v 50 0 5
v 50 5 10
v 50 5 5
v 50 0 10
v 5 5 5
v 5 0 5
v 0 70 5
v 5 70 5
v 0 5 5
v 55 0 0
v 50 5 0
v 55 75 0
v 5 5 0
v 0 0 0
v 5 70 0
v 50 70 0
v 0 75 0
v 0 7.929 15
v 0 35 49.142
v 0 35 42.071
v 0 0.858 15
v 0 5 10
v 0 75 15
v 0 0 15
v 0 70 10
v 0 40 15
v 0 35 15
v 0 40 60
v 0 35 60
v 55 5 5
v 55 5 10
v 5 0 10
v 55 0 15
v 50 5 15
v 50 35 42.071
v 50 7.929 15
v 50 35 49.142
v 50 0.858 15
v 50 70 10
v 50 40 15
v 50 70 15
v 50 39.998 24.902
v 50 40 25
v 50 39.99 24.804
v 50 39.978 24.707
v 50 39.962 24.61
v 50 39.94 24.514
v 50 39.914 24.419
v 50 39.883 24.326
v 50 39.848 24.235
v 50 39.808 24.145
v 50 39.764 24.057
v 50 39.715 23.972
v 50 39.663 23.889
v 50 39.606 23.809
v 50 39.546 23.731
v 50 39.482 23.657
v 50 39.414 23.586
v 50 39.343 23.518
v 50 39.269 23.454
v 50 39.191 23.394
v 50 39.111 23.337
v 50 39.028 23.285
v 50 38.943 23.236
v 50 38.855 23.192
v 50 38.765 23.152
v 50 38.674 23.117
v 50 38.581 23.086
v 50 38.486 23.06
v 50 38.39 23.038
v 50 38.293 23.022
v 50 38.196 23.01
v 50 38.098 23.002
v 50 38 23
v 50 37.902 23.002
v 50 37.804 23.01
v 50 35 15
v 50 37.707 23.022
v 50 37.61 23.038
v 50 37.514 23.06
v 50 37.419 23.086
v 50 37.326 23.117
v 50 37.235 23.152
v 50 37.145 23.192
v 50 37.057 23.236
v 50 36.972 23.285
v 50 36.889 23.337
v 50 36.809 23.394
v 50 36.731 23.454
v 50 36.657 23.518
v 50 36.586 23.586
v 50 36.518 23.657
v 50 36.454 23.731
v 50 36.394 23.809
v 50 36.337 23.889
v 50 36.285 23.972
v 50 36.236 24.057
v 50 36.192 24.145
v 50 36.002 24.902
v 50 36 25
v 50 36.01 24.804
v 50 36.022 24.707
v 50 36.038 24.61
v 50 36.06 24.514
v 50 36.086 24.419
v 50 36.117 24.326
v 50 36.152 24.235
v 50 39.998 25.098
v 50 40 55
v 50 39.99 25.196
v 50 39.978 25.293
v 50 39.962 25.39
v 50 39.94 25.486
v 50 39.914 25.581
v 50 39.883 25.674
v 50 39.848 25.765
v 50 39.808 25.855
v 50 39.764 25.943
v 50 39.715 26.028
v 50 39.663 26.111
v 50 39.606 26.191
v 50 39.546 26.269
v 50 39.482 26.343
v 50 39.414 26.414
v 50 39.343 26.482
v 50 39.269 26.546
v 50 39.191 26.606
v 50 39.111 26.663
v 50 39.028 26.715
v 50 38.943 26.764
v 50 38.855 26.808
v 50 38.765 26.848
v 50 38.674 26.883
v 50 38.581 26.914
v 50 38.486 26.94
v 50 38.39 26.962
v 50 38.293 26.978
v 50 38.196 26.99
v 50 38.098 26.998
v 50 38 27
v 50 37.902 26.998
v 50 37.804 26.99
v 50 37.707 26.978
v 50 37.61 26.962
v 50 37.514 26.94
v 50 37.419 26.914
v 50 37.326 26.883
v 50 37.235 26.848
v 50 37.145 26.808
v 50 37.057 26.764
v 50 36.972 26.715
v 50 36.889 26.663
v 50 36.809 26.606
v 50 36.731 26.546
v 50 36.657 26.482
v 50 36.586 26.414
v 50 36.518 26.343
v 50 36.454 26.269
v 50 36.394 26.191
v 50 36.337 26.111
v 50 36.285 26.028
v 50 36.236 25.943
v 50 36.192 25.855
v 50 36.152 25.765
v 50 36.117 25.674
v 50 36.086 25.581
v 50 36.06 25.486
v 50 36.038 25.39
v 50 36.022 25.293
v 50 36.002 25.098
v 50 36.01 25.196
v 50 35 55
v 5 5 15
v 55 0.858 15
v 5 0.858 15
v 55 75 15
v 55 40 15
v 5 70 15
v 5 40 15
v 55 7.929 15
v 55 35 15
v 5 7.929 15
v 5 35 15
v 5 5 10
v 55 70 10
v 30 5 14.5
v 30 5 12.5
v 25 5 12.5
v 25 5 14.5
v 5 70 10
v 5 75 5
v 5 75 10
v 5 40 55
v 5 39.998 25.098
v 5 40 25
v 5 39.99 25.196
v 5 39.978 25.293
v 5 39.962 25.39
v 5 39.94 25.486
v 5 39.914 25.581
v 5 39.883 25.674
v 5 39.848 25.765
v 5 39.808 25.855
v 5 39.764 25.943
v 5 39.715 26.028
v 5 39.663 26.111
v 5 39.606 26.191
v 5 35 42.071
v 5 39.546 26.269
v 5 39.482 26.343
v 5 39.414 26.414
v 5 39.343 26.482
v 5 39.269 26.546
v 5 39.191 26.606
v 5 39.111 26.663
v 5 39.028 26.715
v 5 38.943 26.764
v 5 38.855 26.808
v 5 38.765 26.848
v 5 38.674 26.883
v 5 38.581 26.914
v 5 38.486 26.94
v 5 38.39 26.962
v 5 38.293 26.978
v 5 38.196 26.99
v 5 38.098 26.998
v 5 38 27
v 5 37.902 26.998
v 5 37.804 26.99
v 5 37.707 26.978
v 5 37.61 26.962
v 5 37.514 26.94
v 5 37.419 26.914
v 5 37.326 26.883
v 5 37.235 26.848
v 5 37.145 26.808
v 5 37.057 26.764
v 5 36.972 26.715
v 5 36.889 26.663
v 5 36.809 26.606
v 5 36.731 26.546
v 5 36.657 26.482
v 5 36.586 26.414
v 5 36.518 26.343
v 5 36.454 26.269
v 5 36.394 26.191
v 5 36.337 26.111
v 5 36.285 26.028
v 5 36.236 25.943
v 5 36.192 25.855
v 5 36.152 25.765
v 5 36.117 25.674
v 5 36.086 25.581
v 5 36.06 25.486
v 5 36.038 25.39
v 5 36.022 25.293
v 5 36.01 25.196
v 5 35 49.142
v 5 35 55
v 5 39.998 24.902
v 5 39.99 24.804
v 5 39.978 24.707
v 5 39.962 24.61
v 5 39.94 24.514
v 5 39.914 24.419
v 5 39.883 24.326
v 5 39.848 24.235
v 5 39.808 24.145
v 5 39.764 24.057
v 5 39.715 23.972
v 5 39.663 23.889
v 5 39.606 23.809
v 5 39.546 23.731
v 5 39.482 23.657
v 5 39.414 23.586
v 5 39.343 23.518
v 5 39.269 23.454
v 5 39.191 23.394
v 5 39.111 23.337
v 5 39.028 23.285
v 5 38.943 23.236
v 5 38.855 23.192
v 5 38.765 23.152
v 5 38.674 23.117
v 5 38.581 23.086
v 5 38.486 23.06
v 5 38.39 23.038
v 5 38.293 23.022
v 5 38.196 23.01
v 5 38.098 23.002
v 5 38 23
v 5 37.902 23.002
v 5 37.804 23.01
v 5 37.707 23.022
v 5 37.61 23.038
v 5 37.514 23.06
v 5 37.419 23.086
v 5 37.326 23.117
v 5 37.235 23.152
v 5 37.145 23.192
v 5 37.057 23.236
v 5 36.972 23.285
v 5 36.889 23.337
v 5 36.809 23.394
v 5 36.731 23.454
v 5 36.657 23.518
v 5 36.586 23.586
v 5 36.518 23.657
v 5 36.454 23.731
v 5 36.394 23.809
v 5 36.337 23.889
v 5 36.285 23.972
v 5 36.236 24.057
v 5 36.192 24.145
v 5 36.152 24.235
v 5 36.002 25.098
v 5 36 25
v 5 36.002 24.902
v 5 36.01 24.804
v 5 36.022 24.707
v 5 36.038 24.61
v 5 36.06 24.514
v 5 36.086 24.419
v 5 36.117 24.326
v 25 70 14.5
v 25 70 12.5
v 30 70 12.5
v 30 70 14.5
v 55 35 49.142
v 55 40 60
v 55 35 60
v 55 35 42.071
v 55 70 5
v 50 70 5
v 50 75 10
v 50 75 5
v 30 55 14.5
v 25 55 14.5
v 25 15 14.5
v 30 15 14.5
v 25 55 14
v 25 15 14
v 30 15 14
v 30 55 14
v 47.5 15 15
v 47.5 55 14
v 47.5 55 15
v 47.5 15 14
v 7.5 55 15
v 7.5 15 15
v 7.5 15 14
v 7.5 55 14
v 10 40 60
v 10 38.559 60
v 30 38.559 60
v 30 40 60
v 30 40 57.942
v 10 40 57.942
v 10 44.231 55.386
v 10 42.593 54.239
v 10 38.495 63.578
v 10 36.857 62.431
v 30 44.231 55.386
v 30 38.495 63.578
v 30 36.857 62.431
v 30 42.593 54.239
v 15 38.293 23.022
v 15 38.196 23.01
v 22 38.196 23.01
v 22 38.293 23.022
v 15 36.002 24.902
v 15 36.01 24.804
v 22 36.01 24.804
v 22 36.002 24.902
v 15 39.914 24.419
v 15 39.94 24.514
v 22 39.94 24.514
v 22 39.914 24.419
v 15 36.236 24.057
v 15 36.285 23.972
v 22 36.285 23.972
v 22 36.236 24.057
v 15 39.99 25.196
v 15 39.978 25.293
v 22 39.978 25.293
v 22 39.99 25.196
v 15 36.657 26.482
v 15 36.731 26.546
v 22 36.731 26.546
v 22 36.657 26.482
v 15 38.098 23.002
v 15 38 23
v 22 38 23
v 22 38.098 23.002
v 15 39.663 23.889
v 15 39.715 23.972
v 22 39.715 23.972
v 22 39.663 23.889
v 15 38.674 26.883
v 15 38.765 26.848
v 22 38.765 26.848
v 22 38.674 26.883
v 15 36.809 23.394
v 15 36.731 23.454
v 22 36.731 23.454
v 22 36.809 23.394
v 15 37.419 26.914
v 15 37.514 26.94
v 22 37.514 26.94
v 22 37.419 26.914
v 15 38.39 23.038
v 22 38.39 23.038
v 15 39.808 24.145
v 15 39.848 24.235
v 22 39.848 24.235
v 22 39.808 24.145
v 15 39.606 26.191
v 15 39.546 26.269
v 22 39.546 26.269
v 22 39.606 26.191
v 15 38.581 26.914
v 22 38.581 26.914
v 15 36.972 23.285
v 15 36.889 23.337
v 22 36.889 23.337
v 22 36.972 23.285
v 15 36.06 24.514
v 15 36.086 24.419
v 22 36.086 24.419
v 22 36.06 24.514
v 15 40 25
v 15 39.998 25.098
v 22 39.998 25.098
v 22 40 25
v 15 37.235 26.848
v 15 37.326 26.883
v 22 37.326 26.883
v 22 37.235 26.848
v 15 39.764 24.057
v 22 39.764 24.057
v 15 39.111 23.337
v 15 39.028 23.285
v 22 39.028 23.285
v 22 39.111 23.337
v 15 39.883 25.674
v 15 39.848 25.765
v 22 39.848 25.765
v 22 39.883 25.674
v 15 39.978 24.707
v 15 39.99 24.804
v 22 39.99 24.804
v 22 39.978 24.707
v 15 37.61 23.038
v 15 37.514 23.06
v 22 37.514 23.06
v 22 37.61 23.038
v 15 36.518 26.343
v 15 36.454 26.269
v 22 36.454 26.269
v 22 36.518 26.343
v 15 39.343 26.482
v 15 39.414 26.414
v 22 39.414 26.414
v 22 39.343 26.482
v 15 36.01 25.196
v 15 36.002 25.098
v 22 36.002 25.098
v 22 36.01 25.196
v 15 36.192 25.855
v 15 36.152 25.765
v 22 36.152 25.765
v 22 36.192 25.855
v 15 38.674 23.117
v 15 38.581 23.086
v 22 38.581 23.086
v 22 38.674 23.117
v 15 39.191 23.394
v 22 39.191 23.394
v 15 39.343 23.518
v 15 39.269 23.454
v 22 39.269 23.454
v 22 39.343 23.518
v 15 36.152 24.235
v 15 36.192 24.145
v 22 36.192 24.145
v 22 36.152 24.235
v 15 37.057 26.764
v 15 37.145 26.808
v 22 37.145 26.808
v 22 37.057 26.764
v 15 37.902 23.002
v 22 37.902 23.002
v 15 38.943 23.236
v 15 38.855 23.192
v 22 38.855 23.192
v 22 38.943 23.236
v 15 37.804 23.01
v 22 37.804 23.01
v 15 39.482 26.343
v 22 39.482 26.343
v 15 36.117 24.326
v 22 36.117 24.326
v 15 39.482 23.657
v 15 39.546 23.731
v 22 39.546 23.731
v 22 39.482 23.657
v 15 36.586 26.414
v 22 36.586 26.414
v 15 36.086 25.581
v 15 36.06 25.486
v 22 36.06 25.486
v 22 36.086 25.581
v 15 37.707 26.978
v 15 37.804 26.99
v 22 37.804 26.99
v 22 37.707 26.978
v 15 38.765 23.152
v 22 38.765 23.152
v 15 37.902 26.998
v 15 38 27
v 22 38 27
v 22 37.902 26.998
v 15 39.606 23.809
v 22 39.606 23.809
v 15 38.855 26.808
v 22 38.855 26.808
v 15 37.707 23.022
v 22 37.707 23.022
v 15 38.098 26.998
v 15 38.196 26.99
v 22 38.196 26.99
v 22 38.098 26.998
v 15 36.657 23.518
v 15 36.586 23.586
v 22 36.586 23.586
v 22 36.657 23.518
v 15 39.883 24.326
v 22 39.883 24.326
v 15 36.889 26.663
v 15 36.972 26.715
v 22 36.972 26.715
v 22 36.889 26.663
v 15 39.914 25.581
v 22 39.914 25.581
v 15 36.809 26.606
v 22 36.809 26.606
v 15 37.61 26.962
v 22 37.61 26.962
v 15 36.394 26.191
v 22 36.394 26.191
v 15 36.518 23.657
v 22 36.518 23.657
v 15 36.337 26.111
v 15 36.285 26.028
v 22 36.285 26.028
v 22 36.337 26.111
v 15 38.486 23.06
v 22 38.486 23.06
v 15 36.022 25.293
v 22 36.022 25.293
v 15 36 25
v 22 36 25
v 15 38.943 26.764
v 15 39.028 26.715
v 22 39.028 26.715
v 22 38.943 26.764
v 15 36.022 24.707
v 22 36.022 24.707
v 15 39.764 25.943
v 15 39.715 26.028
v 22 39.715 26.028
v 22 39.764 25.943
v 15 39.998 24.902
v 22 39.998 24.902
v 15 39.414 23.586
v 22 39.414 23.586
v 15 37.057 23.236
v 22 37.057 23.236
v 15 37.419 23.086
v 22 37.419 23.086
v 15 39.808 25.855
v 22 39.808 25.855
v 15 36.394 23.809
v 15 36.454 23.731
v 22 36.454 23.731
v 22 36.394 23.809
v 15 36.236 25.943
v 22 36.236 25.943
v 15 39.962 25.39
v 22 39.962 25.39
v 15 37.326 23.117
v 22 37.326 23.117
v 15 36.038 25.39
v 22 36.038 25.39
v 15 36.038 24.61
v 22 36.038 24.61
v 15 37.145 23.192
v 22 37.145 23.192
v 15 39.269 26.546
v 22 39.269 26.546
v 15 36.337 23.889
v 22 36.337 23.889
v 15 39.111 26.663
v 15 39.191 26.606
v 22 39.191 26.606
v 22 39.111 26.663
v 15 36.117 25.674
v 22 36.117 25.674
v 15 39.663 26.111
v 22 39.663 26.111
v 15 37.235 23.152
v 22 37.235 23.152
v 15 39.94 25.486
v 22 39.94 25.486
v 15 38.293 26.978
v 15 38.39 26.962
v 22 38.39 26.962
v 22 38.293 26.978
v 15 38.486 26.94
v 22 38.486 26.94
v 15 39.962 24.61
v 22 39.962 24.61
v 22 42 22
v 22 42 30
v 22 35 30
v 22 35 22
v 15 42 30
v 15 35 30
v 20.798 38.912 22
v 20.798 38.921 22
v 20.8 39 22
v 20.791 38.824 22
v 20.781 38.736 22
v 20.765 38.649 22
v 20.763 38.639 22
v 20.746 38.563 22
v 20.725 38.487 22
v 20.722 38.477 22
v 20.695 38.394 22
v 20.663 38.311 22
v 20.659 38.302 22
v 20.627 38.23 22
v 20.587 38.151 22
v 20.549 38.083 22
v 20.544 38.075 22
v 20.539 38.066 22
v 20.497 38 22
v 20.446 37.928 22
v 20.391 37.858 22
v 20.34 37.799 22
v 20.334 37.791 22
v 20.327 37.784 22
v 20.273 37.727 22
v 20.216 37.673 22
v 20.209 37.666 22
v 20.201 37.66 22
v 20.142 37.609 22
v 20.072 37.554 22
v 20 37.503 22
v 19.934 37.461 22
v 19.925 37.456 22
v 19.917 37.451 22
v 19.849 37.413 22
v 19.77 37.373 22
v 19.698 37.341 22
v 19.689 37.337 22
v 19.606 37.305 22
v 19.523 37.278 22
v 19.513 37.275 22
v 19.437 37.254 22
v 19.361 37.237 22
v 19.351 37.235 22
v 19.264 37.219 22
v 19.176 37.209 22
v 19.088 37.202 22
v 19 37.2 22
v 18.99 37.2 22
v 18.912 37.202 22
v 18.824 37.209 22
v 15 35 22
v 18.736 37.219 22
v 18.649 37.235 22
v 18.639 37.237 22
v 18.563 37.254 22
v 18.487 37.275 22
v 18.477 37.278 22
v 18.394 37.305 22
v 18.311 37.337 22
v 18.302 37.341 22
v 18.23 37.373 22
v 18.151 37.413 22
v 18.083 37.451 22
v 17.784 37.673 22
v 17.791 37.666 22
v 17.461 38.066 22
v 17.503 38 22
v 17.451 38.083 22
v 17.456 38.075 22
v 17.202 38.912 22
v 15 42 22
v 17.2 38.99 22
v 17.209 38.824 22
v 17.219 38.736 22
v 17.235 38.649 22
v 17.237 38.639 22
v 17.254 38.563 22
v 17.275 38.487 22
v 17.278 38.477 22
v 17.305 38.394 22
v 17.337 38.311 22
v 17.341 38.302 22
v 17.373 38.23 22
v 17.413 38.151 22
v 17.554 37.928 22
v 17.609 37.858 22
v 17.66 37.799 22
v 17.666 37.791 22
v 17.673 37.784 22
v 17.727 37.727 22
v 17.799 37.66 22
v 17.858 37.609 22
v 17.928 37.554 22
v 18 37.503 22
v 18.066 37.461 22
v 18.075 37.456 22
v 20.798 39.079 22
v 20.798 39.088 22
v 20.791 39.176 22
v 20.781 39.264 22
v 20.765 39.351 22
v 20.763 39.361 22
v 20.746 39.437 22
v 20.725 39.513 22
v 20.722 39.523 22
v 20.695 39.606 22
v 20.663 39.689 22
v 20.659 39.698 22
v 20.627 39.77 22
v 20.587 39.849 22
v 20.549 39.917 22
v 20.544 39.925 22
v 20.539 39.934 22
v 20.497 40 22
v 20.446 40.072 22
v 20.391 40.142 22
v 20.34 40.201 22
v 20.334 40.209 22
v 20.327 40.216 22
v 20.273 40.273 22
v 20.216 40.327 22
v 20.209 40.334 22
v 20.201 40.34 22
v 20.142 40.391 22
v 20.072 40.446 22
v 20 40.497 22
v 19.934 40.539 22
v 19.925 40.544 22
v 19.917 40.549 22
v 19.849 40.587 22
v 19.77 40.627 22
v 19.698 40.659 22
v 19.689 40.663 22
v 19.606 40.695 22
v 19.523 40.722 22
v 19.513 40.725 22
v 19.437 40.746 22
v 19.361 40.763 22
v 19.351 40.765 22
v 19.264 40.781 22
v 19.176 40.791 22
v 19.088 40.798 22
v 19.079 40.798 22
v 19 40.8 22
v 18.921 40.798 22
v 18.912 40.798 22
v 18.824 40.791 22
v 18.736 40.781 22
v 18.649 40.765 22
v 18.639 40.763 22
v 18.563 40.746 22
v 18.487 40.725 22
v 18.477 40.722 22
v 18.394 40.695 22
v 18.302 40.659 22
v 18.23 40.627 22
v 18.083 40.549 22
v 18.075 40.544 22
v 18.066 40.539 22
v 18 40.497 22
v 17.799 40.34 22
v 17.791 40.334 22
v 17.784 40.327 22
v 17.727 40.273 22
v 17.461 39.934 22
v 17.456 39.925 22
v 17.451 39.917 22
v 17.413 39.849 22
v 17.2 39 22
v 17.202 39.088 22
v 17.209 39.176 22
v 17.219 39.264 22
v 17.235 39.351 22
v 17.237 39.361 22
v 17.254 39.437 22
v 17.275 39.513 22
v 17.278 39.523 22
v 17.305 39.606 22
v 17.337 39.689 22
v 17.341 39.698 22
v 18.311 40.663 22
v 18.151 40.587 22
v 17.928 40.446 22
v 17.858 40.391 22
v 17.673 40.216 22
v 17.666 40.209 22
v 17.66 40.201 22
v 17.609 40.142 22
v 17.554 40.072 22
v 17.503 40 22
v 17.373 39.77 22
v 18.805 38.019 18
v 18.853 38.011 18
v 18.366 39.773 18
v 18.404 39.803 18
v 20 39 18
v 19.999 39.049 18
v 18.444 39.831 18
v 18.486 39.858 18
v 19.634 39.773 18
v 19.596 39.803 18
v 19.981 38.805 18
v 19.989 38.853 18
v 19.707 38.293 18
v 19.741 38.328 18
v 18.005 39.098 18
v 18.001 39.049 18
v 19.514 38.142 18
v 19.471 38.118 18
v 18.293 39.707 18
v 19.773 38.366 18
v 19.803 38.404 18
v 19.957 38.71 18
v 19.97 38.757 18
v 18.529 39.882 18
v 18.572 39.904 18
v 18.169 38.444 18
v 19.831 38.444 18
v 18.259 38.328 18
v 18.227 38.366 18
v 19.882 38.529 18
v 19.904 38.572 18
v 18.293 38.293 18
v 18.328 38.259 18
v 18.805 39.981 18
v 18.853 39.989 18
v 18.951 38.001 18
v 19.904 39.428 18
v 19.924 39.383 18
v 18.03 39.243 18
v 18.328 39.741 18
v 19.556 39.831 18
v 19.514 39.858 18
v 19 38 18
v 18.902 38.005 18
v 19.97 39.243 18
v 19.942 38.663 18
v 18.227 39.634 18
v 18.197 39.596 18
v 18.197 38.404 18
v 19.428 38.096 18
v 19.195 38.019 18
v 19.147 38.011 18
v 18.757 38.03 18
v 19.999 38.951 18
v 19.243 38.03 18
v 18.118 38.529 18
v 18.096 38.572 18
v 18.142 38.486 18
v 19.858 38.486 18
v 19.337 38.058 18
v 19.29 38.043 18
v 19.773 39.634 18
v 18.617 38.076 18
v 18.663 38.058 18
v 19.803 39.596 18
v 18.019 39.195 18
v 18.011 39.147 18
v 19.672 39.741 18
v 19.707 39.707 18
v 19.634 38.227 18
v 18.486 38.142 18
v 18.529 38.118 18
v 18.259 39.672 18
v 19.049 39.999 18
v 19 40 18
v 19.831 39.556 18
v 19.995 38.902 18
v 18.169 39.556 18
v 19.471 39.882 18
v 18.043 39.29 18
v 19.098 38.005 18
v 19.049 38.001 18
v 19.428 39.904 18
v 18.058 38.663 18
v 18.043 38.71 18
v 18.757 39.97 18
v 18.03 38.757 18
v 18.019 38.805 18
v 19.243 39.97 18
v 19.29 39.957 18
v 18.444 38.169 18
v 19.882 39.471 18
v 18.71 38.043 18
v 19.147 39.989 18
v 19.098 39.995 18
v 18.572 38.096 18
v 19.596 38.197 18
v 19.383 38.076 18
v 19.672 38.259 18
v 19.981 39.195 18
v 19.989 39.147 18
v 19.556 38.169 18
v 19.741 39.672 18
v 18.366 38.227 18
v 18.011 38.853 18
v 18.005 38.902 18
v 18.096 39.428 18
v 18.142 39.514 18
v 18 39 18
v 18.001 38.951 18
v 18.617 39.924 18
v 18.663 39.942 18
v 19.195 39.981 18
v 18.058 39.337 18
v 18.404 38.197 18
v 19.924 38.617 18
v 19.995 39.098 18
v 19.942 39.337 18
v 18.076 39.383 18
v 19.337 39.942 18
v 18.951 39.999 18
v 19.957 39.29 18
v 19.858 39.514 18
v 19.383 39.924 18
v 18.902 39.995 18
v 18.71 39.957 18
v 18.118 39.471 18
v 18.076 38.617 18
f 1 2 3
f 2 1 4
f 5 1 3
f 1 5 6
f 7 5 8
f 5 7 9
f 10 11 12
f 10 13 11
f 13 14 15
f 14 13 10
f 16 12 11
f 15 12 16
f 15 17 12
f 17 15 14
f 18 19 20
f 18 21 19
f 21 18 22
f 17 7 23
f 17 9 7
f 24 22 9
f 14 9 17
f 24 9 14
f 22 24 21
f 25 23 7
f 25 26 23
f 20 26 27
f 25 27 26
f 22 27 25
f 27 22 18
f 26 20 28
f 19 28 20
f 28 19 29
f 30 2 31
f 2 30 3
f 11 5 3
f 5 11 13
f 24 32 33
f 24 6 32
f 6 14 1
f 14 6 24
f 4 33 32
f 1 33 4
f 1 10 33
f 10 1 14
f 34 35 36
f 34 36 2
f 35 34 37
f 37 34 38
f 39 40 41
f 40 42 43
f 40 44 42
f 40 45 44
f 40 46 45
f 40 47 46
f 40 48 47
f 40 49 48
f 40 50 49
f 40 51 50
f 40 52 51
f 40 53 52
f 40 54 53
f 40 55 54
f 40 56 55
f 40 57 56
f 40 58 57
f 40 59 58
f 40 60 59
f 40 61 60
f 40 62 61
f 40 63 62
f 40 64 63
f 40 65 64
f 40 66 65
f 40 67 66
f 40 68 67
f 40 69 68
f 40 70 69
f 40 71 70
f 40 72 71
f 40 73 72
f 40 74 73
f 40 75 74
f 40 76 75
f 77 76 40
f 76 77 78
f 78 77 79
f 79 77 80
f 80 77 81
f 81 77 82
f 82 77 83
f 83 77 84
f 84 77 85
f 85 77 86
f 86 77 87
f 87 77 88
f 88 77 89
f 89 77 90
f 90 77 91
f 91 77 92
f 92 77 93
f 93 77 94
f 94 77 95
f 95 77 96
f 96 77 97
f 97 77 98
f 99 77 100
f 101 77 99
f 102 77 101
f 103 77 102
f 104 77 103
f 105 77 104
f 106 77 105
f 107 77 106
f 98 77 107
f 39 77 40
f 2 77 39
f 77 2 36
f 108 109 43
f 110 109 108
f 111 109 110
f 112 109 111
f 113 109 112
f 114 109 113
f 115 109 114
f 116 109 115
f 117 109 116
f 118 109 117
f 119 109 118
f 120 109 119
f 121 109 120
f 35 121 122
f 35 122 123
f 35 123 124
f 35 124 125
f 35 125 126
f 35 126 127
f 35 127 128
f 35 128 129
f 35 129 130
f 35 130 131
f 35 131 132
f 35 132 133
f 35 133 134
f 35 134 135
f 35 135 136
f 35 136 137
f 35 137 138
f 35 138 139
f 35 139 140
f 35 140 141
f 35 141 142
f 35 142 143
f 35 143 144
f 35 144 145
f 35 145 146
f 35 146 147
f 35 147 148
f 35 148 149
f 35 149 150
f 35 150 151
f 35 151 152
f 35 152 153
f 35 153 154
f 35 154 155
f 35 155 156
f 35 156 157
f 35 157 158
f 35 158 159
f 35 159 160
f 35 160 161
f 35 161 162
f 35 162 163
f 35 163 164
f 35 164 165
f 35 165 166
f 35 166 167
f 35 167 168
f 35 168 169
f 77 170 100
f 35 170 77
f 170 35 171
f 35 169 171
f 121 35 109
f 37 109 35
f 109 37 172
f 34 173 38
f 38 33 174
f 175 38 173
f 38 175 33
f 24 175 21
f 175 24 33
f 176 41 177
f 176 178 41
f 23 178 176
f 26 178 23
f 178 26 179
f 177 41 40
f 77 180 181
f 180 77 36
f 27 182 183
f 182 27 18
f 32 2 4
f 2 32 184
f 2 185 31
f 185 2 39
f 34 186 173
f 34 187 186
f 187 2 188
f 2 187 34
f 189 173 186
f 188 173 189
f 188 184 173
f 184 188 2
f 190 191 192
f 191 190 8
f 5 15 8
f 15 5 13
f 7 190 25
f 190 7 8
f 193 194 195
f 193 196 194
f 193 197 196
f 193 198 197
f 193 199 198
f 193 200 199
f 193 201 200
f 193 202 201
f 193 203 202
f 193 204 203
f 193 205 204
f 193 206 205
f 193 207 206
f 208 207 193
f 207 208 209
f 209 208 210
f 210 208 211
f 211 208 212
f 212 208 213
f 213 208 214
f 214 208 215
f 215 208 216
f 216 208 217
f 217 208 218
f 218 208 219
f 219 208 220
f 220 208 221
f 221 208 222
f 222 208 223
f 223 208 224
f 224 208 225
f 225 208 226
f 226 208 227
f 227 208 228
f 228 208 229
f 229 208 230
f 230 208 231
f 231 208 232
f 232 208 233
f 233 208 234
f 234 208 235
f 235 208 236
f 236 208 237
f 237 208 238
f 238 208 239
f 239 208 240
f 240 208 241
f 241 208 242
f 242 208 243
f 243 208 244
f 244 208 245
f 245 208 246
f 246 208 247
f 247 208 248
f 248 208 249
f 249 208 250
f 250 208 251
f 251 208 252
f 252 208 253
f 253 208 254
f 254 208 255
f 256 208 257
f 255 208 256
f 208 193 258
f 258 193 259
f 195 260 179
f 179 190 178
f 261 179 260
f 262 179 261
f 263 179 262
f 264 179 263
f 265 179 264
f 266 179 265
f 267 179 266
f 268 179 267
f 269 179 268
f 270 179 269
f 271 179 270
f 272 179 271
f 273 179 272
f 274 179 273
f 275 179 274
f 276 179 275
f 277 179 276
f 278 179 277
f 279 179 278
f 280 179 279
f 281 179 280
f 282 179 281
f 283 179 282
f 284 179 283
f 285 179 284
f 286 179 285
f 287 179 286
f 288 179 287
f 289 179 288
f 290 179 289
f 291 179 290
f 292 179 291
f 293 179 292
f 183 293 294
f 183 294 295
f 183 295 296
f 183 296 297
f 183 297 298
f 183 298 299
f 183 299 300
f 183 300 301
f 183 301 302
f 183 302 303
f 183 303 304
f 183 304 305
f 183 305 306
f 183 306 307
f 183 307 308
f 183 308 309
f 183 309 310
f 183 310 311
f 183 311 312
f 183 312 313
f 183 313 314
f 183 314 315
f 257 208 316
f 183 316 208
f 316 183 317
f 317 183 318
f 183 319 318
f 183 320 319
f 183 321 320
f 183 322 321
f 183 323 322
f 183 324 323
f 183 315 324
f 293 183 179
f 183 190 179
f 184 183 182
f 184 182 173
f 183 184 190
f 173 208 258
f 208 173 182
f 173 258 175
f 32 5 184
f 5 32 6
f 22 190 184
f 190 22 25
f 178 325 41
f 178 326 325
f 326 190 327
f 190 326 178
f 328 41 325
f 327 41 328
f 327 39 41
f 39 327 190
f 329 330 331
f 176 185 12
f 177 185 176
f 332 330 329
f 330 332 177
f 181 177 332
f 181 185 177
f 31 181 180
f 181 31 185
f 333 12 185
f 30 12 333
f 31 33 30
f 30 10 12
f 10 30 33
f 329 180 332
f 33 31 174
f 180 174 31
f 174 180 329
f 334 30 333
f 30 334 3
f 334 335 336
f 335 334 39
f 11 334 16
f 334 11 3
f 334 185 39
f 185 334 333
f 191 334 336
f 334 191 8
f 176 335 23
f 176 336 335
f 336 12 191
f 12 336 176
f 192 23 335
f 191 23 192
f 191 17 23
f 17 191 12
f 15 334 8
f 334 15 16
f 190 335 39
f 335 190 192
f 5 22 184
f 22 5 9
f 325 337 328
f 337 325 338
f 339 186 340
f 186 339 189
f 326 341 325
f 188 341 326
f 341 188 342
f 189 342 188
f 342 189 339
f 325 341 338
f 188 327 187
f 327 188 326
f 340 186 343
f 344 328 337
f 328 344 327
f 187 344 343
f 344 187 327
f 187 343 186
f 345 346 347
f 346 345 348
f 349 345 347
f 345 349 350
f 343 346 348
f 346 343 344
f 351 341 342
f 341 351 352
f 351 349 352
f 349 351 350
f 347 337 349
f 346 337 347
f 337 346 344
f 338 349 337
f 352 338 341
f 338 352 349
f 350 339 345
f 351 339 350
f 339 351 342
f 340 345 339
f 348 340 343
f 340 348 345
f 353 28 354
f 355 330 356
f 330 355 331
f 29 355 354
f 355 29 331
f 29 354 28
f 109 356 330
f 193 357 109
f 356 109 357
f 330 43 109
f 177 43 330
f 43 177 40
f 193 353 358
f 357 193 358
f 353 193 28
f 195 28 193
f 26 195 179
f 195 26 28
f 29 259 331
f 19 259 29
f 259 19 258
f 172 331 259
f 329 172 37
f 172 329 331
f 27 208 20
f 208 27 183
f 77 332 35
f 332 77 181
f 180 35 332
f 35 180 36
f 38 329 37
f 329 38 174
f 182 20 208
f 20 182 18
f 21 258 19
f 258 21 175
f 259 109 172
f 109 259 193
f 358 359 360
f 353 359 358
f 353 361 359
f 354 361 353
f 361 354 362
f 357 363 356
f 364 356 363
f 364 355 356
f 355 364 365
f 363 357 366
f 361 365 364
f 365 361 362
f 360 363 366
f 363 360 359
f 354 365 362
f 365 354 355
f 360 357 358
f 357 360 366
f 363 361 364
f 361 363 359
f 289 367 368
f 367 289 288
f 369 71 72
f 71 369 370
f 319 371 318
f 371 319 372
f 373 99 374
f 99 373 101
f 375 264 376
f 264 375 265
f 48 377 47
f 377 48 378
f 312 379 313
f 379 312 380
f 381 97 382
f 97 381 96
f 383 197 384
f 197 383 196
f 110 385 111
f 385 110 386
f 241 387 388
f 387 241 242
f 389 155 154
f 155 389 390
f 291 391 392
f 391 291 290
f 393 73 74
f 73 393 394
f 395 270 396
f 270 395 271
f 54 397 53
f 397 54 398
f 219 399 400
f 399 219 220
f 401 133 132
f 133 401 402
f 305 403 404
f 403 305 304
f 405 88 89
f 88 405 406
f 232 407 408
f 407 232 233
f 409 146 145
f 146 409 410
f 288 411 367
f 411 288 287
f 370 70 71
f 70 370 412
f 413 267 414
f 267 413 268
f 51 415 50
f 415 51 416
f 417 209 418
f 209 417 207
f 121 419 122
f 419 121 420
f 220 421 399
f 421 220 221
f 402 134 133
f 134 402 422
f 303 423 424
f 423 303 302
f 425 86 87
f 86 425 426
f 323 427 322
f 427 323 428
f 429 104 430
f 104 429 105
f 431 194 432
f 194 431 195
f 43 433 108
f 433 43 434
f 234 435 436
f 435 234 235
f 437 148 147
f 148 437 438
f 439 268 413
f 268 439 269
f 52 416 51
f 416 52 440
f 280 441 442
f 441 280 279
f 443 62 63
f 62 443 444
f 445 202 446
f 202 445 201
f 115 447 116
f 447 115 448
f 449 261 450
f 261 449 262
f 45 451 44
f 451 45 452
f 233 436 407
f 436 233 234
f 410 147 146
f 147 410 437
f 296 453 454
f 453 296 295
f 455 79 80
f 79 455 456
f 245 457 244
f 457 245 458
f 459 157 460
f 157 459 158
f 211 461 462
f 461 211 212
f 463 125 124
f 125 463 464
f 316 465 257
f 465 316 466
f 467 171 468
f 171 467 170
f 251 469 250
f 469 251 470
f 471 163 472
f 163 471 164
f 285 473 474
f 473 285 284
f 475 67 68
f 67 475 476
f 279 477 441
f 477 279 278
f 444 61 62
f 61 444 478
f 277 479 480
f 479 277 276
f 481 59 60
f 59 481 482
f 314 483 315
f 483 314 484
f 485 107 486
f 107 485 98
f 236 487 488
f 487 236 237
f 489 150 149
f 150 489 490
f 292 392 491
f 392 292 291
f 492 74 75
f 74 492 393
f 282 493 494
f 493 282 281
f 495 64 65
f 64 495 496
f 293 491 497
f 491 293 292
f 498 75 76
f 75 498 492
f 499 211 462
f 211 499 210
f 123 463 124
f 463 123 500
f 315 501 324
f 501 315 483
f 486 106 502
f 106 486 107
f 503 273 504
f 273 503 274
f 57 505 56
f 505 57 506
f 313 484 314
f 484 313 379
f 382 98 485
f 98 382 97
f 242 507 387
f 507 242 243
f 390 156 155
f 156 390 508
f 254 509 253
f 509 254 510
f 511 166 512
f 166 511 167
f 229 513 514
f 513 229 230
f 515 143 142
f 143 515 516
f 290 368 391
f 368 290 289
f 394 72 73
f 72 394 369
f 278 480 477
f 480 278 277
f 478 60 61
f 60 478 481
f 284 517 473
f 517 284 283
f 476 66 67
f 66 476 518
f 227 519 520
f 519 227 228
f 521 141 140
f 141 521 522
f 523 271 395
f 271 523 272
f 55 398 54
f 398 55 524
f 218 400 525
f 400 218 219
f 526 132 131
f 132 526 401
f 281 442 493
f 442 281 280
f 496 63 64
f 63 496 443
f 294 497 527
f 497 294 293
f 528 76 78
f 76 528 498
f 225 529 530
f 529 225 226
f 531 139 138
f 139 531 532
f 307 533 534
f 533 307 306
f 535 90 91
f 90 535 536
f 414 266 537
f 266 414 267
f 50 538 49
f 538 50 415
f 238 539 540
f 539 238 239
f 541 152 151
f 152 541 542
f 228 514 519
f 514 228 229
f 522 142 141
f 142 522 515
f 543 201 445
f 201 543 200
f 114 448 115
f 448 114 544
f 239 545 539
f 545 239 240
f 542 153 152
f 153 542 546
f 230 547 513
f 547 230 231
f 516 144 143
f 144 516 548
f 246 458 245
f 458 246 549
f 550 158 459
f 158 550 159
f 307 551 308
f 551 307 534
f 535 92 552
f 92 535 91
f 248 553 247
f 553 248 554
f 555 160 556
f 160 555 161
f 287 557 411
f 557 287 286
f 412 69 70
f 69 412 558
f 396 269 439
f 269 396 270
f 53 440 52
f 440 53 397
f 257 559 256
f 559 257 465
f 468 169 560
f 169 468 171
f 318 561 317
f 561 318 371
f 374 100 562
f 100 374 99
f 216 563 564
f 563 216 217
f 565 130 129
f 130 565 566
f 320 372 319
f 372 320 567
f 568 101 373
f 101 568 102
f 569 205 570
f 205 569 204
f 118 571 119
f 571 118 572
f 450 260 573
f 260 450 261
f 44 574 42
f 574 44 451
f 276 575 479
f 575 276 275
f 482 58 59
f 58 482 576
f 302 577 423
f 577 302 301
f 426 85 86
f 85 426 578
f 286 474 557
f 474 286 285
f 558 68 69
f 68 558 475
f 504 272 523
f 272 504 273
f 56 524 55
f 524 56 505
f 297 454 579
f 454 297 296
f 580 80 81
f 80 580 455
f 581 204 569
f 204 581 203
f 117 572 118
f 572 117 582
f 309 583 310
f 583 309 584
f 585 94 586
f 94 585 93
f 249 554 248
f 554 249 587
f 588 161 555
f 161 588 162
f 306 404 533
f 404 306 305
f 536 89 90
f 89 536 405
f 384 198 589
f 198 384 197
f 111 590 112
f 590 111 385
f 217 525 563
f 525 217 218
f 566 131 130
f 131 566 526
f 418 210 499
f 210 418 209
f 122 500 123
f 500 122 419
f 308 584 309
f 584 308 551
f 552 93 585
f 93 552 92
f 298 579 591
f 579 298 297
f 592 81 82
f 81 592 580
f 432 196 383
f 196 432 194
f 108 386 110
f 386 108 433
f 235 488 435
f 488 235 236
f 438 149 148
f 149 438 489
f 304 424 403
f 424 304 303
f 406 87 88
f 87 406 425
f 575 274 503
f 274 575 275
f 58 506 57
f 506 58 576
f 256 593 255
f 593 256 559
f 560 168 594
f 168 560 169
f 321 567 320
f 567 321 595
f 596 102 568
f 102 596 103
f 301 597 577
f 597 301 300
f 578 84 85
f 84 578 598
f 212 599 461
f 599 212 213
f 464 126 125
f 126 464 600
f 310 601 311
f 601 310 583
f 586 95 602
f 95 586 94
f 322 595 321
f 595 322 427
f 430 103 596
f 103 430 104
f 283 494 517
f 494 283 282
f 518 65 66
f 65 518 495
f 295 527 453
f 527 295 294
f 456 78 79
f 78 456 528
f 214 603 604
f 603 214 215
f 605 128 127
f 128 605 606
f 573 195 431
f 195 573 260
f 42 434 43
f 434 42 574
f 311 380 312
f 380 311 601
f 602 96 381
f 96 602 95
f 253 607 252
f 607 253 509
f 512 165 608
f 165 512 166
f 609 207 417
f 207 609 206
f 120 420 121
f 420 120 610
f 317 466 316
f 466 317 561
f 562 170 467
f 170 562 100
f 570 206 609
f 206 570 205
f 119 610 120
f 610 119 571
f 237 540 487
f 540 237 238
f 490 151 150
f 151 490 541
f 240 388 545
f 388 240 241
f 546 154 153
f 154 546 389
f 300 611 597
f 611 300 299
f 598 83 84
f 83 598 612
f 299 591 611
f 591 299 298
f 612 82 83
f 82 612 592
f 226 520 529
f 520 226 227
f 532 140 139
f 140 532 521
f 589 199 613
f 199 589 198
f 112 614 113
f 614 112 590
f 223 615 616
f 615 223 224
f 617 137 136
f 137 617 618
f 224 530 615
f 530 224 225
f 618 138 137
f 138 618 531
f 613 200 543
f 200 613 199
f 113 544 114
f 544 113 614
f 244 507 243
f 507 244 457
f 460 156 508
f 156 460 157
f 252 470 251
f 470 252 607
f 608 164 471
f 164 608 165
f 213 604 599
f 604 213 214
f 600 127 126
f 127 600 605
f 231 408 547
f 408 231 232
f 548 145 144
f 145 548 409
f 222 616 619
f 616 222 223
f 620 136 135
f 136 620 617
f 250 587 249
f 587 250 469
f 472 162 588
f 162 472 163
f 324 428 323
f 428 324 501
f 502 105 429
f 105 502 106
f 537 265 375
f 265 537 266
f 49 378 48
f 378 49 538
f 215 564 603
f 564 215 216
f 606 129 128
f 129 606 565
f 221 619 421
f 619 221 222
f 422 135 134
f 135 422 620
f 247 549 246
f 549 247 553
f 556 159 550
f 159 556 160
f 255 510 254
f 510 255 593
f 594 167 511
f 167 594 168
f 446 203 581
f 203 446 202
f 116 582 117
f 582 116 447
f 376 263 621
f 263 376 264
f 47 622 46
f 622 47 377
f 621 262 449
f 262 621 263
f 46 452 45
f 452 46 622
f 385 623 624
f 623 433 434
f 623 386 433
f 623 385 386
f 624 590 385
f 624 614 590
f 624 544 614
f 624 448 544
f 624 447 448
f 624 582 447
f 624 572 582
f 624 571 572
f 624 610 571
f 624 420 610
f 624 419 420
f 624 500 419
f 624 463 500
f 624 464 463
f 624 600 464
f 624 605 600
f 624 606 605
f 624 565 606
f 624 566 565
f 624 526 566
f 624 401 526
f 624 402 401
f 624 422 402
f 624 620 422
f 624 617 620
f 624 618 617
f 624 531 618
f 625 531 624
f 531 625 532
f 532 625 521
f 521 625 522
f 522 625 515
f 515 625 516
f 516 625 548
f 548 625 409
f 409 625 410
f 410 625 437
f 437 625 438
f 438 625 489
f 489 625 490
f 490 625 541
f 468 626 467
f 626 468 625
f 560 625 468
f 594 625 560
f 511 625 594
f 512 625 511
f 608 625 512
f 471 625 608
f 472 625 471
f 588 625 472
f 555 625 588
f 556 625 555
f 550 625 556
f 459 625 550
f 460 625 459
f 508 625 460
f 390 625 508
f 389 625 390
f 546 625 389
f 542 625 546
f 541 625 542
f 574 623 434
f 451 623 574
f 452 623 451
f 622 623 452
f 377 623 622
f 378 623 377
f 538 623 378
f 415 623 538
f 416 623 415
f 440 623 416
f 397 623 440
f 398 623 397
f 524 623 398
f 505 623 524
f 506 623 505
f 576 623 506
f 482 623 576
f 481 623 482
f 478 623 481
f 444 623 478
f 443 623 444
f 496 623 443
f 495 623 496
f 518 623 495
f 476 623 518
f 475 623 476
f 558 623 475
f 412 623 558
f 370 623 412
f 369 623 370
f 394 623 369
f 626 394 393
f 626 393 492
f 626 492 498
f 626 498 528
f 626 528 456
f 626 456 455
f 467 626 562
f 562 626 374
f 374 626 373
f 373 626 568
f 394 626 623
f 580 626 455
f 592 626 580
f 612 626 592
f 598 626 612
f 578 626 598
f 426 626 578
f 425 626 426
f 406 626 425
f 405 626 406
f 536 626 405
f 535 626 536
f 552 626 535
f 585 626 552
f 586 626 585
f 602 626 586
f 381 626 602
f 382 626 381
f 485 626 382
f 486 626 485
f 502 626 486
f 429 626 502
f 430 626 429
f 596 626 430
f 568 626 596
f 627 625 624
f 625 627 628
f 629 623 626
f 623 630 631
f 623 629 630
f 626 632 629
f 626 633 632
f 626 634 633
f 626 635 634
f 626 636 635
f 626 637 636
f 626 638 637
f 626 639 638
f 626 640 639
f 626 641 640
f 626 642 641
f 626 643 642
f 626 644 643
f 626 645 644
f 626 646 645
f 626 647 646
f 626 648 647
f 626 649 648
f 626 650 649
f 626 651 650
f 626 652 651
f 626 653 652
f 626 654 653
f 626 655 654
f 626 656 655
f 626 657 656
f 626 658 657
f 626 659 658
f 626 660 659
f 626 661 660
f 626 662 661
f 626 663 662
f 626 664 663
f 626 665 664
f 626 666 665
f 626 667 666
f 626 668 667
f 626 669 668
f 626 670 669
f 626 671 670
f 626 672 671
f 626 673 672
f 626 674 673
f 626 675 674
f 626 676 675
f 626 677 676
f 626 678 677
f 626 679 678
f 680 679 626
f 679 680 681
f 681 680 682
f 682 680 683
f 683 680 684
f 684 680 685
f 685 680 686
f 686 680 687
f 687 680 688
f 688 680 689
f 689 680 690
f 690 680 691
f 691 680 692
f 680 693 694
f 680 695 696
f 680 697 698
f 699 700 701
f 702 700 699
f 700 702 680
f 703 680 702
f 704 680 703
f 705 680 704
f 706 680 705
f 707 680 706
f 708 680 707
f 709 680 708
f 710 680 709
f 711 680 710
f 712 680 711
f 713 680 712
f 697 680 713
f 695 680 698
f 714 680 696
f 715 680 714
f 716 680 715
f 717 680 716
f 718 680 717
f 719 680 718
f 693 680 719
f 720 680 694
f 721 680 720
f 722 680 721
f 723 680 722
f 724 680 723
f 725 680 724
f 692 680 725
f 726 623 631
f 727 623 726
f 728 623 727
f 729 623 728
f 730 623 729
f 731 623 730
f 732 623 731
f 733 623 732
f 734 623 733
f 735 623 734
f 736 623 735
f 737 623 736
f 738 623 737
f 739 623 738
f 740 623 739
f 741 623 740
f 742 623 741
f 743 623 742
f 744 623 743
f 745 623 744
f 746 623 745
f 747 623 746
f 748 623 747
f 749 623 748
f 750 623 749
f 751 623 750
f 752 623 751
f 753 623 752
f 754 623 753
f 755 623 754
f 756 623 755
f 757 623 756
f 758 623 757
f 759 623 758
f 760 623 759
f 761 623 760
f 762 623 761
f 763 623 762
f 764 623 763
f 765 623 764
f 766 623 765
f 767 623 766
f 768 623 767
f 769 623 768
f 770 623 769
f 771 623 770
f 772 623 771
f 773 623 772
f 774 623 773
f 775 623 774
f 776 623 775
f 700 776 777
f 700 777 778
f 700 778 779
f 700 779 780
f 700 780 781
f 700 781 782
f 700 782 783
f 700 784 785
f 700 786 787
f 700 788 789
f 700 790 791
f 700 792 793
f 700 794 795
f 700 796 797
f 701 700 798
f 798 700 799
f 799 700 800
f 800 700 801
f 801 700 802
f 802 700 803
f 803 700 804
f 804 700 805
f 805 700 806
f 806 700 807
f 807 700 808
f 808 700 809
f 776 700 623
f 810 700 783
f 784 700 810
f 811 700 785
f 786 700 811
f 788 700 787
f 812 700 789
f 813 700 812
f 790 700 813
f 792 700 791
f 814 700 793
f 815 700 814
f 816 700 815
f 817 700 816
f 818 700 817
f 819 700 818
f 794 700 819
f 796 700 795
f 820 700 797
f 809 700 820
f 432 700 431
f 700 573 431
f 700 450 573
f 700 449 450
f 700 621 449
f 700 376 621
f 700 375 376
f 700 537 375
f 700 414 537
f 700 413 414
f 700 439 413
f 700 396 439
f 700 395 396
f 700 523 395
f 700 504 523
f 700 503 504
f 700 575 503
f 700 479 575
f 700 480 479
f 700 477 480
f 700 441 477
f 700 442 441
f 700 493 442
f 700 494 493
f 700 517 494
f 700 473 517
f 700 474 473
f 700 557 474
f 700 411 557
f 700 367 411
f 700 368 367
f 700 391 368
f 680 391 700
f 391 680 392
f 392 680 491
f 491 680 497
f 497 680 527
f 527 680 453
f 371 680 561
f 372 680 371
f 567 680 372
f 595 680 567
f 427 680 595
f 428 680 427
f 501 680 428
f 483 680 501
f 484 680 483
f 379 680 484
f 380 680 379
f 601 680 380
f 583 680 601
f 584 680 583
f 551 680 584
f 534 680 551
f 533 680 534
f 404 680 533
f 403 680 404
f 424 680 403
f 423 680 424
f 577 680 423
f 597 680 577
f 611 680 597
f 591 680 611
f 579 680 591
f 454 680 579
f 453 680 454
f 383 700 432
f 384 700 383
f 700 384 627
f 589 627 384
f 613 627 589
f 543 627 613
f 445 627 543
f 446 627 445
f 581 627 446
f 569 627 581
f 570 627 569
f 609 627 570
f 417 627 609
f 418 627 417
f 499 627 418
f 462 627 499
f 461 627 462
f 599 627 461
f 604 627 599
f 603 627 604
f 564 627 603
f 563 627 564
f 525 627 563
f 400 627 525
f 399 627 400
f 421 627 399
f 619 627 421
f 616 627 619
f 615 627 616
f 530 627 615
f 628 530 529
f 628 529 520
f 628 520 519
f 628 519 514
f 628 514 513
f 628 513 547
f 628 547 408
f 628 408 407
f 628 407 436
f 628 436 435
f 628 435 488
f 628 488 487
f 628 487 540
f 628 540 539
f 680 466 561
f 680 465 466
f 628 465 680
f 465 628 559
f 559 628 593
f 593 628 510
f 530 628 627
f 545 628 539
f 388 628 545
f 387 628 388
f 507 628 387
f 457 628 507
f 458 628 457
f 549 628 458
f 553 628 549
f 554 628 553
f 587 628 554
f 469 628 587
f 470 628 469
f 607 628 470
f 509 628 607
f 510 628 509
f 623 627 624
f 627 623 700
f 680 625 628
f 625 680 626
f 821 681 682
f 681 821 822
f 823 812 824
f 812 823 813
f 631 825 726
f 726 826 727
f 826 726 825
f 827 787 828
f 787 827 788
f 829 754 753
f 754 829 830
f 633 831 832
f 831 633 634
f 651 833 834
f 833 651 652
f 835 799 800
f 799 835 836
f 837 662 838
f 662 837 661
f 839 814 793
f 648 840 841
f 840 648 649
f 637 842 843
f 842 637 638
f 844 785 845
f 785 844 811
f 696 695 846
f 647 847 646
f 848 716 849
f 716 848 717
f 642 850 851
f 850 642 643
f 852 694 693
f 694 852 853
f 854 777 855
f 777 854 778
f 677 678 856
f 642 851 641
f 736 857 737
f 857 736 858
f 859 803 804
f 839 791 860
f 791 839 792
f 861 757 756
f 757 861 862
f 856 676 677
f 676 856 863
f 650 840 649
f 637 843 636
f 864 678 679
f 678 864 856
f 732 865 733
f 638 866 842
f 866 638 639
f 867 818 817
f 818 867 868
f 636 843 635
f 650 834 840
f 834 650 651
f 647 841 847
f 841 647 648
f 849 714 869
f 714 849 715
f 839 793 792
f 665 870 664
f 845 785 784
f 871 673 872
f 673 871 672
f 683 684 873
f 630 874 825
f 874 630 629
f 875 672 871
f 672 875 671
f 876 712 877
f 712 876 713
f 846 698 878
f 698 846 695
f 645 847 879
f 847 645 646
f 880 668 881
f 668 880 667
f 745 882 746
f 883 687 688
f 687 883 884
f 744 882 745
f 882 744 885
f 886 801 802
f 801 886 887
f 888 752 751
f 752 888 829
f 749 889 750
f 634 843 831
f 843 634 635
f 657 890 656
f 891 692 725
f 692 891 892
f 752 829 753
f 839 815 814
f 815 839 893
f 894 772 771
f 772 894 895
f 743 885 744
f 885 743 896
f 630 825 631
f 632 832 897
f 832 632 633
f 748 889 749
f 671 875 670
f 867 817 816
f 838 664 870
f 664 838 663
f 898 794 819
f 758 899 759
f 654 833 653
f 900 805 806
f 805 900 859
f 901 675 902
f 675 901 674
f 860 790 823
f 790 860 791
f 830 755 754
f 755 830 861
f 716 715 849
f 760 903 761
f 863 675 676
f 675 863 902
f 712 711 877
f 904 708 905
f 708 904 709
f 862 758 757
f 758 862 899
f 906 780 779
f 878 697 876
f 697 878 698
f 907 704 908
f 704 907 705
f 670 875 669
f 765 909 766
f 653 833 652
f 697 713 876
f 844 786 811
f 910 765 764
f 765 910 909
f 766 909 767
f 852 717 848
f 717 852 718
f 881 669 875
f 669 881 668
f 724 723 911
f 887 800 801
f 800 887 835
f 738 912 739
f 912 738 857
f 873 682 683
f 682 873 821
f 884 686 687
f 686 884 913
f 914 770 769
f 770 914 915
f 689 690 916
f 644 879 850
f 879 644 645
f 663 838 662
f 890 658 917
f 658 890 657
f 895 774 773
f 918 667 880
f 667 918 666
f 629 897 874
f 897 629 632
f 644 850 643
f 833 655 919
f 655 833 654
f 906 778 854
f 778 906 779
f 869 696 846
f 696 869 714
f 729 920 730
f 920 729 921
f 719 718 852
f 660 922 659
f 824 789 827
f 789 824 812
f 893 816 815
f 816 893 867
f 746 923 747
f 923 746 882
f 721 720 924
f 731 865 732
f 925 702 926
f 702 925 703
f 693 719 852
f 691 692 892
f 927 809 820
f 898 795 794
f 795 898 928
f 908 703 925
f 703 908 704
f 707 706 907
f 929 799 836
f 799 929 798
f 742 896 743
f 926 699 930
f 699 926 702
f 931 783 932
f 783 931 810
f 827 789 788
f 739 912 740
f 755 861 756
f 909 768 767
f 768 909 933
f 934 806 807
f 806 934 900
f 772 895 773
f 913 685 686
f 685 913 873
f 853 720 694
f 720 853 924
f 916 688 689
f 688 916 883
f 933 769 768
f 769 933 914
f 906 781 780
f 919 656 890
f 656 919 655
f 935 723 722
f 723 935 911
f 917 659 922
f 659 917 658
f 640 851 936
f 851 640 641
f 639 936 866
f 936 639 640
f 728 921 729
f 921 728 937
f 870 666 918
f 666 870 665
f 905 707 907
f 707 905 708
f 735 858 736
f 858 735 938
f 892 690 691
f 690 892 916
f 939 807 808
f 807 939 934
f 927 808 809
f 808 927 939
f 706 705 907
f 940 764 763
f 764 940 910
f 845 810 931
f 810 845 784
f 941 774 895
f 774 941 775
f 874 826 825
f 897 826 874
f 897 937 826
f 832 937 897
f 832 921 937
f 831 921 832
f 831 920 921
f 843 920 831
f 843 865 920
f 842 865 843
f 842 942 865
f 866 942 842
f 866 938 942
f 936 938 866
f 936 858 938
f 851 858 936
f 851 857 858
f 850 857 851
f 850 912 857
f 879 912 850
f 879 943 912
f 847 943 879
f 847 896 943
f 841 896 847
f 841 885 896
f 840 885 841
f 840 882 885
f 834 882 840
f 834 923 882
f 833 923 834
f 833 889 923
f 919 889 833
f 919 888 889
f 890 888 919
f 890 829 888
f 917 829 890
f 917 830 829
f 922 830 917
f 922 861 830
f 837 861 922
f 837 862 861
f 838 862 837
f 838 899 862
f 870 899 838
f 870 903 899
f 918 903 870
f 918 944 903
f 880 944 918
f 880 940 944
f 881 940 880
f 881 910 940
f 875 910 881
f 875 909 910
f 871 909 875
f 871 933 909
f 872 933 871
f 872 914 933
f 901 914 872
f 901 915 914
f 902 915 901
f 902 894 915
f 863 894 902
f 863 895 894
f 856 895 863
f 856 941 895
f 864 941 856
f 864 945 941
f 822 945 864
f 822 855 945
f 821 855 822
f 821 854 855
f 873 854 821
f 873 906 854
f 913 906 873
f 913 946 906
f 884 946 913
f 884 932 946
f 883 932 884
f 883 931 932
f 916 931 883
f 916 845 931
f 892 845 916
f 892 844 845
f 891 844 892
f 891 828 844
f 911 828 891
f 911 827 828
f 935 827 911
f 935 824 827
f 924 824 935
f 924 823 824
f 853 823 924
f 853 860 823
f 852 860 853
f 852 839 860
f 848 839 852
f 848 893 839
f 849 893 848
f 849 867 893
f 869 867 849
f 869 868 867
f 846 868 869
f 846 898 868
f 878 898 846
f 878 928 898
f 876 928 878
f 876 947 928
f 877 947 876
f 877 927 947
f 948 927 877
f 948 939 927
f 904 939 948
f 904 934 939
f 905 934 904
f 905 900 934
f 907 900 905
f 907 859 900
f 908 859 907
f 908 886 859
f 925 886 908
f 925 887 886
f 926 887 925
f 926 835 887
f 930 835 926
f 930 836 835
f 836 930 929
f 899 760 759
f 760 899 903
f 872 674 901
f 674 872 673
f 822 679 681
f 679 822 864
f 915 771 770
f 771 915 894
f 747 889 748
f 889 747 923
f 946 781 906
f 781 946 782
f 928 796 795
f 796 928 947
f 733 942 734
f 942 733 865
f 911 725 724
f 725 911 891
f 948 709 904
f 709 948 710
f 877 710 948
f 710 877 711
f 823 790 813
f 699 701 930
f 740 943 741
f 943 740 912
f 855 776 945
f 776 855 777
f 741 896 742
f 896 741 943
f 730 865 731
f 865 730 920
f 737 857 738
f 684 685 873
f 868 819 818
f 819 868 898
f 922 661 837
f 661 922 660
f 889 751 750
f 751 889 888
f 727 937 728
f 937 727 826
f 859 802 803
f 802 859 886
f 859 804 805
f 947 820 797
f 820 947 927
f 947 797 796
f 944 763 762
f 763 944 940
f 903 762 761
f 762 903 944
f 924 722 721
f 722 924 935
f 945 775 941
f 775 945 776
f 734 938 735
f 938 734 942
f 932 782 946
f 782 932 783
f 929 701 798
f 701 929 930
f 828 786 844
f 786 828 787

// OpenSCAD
$fn=128;
h=50;
//делаю перекладины
cube ([50,5,5]); 
translate ([0,0,10])cube ([50,5,5]); 
cube ([5,70,5]);
translate ([0,0,10])cube ([5,70,5]); 
translate ([50,0,0])cube ([5,70,5]);
translate ([50,0,10])cube ([5,70,5]); 
translate ([0,70,0])cube ([55,5,5]);
translate ([0,70,10])cube ([55,5,5]);
cube ([5,5,10]);
translate ([50,0,0])cube ([5,5,10]);
translate ([50,70,0])cube ([5,5,10]);
translate ([0,70,0])cube ([5,5,10]);
//делаю стекляную панель
rotate ([0,0,90])translate ([0,-30,12.5])cube ([70,5,2]);
translate ([7.5,15,14])cube ([40,40,1]);
//делаю перекладины
translate ([0,35,10])cube ([5,5,50]); 
translate ([50,35,10])cube ([5,5,50]); 
rotate ([-45,0,0])translate ([50,-10,10])cube ([5,5,50]); 
rotate ([-45,0,0])translate ([0,-10,10]) 
cube ([5,5,50]); 
translate ([2.5,35,55])cube ([50,5,5]);
//панелька с настройками
rotate ([35,0,0])translate ([10,66,20])cube ([20,2,10]);
//перекладина с экструдером
translate ([2.5,38,25])rotate ([0,90,0])cylinder (50,2,2);
translate ([15,35,22])cube ([7,7,8]);
translate ([19,39,18])cylinder (5,1,2);
